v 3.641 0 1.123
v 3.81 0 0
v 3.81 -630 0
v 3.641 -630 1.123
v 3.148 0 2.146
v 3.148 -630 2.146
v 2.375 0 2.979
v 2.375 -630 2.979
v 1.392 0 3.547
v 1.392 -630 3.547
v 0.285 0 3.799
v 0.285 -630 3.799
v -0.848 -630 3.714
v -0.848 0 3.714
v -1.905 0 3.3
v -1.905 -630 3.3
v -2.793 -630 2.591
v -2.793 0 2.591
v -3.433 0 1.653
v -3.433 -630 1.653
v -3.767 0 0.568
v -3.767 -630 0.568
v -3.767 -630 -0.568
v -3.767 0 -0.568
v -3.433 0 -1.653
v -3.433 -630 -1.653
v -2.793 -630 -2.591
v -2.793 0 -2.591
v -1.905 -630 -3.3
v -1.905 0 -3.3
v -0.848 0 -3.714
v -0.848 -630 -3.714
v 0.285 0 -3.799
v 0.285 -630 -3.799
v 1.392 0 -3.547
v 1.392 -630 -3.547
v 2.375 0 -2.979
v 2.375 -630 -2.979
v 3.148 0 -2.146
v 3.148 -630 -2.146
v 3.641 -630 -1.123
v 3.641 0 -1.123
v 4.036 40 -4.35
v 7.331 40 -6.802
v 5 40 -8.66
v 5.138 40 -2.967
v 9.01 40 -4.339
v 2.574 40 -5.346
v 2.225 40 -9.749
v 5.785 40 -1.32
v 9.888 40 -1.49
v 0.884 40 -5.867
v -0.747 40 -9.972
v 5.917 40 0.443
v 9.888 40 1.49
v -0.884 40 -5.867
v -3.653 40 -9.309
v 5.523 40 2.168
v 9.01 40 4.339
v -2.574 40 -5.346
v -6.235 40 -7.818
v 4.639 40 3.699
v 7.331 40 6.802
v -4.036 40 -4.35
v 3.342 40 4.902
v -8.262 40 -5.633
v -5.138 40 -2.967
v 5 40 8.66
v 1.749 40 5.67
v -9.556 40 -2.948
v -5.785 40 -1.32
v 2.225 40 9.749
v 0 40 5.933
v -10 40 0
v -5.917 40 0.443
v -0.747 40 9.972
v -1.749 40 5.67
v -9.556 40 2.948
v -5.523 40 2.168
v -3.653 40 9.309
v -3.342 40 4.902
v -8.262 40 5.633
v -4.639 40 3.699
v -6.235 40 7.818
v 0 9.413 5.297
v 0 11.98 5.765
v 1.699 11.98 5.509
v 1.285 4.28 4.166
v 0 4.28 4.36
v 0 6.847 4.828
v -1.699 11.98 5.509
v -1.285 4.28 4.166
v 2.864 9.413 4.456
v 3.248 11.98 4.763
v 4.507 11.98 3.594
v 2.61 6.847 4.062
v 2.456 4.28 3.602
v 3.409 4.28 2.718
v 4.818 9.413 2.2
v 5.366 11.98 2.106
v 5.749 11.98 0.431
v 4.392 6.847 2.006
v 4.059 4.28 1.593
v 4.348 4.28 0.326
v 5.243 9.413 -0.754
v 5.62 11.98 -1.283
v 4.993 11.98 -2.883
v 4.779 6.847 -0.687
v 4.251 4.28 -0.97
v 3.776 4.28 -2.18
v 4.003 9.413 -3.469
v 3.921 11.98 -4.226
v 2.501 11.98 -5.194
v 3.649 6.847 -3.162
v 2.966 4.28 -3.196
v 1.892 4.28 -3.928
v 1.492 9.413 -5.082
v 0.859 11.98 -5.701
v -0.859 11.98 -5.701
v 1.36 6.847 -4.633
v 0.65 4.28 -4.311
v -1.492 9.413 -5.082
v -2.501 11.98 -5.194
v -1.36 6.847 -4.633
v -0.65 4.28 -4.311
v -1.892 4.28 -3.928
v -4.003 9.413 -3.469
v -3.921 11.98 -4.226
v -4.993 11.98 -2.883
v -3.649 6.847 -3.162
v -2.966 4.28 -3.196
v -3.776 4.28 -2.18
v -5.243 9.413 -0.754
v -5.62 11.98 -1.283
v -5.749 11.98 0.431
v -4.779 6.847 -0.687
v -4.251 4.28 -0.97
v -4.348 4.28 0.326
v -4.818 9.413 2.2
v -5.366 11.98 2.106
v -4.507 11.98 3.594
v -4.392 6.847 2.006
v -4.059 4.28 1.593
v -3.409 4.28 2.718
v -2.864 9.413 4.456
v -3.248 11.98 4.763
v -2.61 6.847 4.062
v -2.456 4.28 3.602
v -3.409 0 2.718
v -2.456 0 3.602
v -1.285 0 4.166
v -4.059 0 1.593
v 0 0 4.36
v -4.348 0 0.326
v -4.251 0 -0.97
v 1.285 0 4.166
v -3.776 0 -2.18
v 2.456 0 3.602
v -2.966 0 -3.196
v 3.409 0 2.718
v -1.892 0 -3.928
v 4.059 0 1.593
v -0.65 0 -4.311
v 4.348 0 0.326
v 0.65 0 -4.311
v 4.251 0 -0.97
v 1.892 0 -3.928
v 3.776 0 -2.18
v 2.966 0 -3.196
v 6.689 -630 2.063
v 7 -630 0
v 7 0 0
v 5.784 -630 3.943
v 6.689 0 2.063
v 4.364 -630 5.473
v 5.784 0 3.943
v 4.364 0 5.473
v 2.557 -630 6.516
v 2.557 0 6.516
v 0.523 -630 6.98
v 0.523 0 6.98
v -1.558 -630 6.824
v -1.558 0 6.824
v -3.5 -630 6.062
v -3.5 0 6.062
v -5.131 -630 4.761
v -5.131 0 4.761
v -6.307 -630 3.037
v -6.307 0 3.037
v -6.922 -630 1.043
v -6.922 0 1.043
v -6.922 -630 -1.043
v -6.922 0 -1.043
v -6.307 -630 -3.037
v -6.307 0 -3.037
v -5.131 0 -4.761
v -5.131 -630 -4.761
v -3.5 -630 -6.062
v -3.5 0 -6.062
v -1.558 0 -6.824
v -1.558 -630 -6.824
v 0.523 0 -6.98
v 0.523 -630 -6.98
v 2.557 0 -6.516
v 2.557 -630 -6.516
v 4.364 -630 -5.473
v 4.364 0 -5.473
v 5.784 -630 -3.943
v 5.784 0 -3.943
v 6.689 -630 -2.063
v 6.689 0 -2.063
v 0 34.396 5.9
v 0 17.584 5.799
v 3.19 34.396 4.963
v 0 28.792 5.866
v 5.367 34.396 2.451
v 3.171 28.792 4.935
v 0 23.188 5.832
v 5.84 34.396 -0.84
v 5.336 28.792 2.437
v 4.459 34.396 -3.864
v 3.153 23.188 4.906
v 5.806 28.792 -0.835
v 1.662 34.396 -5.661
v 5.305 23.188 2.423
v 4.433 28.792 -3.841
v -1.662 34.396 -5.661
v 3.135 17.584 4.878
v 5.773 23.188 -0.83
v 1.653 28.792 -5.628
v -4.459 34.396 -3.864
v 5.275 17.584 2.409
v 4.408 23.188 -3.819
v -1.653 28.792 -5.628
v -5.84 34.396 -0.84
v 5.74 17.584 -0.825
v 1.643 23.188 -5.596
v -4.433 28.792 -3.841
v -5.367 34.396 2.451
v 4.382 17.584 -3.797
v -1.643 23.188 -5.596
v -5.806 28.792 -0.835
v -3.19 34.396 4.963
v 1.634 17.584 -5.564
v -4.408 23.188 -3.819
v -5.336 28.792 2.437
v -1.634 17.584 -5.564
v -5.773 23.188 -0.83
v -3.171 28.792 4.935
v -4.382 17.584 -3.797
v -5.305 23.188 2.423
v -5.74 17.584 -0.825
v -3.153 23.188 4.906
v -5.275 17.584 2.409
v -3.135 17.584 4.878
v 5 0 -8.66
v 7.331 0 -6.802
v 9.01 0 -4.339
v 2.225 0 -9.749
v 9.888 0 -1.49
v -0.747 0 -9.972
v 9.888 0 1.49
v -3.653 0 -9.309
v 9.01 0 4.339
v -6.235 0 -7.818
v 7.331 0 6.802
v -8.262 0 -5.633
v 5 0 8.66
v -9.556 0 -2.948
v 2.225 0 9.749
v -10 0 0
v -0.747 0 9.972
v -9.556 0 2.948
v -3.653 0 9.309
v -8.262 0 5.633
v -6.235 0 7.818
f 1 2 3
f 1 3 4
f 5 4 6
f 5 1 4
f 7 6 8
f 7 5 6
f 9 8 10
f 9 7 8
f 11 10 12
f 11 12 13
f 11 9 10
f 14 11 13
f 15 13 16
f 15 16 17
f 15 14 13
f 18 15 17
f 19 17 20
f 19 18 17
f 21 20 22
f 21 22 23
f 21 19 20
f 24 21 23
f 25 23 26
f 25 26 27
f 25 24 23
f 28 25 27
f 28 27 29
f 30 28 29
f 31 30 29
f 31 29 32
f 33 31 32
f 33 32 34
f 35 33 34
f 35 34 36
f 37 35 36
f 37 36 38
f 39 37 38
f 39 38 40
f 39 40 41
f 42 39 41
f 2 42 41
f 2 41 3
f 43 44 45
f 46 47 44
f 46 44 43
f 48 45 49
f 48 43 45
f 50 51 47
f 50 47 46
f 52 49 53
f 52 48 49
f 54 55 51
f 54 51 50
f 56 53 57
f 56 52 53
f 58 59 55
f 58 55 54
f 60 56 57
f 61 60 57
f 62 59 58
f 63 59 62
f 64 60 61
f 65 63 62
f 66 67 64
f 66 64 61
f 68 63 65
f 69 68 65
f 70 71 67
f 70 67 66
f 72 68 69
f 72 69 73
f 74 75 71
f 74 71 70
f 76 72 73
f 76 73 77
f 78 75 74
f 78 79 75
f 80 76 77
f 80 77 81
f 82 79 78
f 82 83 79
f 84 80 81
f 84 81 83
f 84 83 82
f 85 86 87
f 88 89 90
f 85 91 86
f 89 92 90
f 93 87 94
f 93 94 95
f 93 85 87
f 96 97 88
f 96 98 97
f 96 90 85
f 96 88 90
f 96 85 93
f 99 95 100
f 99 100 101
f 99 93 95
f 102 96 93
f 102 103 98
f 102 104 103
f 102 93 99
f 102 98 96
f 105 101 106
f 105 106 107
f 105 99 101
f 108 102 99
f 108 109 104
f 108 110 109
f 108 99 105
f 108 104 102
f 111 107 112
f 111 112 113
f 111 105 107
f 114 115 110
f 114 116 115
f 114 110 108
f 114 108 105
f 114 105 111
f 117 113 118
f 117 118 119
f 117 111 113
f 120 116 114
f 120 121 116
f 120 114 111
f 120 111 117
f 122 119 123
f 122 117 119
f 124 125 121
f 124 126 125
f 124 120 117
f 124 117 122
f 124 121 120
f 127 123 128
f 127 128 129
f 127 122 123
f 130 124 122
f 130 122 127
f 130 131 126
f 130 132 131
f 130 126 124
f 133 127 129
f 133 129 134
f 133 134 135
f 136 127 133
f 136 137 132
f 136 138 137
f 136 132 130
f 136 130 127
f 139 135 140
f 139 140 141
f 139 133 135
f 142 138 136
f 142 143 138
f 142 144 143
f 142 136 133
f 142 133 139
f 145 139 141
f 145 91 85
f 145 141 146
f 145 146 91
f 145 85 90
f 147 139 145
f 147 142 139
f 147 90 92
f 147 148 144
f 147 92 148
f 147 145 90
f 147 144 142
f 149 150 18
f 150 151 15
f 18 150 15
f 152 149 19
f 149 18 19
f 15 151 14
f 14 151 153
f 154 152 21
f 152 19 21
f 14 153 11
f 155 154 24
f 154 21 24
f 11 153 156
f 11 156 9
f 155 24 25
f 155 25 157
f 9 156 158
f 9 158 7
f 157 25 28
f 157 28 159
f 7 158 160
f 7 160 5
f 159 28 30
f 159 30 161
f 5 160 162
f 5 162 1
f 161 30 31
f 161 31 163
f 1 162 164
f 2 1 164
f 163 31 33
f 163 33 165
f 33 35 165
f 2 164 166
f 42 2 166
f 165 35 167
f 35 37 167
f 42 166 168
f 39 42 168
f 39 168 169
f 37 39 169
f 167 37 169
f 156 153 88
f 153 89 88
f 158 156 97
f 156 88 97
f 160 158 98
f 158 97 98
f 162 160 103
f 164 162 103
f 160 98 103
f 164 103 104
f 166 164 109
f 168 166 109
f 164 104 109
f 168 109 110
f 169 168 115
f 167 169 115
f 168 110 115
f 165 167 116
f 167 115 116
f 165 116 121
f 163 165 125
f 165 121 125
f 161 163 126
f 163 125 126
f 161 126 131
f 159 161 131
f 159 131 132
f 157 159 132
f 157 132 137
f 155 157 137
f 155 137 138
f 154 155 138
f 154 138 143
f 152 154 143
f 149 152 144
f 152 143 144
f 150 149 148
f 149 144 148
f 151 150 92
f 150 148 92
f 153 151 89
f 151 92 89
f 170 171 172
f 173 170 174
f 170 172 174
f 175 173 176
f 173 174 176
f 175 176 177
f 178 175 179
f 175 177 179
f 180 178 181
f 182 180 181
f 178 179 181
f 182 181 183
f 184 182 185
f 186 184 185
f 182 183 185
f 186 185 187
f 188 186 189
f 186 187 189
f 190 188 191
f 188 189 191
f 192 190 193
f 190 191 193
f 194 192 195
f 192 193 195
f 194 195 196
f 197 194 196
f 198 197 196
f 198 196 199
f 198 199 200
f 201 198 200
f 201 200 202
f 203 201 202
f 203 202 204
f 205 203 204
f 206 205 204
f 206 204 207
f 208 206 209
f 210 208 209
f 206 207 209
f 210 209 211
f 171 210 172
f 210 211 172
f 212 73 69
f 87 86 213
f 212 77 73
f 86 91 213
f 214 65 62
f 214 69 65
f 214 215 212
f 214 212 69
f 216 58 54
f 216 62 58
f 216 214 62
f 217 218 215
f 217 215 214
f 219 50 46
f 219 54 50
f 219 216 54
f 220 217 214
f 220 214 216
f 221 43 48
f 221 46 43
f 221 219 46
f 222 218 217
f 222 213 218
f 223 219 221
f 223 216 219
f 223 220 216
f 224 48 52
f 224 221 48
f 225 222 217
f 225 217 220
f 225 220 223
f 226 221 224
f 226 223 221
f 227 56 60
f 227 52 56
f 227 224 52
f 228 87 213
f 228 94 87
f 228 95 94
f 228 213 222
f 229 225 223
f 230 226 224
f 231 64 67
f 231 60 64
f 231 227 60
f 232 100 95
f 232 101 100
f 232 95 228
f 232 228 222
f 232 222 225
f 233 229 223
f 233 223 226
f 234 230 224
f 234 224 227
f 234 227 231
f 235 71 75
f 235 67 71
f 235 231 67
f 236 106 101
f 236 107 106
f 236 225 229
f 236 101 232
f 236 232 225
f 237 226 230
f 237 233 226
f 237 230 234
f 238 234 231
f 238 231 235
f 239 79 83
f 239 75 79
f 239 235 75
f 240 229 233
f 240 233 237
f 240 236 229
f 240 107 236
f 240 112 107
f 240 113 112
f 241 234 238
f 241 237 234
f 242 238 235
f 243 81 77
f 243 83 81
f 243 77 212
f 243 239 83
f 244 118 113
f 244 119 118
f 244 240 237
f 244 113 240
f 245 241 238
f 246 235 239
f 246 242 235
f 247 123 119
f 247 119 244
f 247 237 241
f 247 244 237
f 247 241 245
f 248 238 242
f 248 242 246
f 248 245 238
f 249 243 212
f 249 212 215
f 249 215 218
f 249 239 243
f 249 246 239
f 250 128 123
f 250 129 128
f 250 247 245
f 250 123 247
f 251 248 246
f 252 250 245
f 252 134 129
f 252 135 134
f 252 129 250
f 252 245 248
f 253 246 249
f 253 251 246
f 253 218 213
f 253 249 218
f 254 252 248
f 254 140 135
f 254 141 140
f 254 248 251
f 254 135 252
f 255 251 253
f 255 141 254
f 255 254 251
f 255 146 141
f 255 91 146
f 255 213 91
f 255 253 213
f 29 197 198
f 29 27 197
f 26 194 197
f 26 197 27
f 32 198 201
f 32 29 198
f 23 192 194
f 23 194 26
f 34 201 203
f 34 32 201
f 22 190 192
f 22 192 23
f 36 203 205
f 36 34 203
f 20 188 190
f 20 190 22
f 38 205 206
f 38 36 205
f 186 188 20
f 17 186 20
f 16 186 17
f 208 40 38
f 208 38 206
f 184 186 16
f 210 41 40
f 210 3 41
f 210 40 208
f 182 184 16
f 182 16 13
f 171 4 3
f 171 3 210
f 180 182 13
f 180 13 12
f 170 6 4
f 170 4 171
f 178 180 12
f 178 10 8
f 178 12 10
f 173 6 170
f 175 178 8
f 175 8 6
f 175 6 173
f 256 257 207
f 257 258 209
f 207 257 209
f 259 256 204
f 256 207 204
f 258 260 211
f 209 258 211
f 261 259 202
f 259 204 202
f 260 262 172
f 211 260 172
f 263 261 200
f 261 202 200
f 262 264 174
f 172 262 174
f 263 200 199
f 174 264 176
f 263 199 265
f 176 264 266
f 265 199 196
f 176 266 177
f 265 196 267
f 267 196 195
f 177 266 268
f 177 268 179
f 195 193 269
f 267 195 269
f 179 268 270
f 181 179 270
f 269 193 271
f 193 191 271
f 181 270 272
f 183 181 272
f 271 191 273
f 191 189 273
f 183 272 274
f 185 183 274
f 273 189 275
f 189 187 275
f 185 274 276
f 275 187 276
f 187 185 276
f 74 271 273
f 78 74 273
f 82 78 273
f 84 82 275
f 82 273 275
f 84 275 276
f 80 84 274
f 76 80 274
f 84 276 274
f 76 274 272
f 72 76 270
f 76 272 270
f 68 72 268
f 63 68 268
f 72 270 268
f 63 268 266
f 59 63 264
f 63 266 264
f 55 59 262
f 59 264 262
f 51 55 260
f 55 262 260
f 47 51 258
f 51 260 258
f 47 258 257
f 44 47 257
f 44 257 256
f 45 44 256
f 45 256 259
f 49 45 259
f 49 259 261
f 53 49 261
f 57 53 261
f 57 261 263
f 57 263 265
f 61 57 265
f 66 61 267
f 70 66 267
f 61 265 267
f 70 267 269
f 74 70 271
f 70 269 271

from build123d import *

# Parameters (mm, degrees)
F0_R     = 7
F0_R_2   = 3.81
F1_DEPTH = 630
F2_R     = 10
F2_R_2   = 7
F2_R_3   = 3.81
F3_DEPTH = 40
F4_W     = 4.28
F4_H     = 4.36


with BuildPart() as f1:
    # F0 (on Front) → F1 (new body)
    with BuildSketch(Plane.XZ):
        Circle(F0_R)
        Circle(F0_R_2, mode=Mode.SUBTRACT)
    extrude(amount=F1_DEPTH)

    # F2 (on face) → F3 (join)
    with BuildSketch(Plane(origin=(0, 0, 0), x_dir=(-1, 0, 0), z_dir=(0, 1, 0))):
        Circle(F2_R)
        Circle(F2_R_2, mode=Mode.SUBTRACT)
        Circle(F2_R_2)
        Circle(F2_R_3, mode=Mode.SUBTRACT)
    extrude(amount=F3_DEPTH)

    # F4 (on Right) → F5 (revolve, cut)
    with BuildSketch(Plane.YZ):
        with Locations((2.14, 2.18)):
            Rectangle(F4_W, F4_H)
        Polygon((4.28, 4.36), (4.28, 0), (11.98, 0), (11.98, 5.765), align=None)
        Polygon((11.98, 5.765), (11.98, 0), (47.75, 0), (47.75, 5.98), align=None)
    revolve(axis=Axis((0, 29.865, 0), (0, 1, 0)), mode=Mode.SUBTRACT)


solid = f1.part
